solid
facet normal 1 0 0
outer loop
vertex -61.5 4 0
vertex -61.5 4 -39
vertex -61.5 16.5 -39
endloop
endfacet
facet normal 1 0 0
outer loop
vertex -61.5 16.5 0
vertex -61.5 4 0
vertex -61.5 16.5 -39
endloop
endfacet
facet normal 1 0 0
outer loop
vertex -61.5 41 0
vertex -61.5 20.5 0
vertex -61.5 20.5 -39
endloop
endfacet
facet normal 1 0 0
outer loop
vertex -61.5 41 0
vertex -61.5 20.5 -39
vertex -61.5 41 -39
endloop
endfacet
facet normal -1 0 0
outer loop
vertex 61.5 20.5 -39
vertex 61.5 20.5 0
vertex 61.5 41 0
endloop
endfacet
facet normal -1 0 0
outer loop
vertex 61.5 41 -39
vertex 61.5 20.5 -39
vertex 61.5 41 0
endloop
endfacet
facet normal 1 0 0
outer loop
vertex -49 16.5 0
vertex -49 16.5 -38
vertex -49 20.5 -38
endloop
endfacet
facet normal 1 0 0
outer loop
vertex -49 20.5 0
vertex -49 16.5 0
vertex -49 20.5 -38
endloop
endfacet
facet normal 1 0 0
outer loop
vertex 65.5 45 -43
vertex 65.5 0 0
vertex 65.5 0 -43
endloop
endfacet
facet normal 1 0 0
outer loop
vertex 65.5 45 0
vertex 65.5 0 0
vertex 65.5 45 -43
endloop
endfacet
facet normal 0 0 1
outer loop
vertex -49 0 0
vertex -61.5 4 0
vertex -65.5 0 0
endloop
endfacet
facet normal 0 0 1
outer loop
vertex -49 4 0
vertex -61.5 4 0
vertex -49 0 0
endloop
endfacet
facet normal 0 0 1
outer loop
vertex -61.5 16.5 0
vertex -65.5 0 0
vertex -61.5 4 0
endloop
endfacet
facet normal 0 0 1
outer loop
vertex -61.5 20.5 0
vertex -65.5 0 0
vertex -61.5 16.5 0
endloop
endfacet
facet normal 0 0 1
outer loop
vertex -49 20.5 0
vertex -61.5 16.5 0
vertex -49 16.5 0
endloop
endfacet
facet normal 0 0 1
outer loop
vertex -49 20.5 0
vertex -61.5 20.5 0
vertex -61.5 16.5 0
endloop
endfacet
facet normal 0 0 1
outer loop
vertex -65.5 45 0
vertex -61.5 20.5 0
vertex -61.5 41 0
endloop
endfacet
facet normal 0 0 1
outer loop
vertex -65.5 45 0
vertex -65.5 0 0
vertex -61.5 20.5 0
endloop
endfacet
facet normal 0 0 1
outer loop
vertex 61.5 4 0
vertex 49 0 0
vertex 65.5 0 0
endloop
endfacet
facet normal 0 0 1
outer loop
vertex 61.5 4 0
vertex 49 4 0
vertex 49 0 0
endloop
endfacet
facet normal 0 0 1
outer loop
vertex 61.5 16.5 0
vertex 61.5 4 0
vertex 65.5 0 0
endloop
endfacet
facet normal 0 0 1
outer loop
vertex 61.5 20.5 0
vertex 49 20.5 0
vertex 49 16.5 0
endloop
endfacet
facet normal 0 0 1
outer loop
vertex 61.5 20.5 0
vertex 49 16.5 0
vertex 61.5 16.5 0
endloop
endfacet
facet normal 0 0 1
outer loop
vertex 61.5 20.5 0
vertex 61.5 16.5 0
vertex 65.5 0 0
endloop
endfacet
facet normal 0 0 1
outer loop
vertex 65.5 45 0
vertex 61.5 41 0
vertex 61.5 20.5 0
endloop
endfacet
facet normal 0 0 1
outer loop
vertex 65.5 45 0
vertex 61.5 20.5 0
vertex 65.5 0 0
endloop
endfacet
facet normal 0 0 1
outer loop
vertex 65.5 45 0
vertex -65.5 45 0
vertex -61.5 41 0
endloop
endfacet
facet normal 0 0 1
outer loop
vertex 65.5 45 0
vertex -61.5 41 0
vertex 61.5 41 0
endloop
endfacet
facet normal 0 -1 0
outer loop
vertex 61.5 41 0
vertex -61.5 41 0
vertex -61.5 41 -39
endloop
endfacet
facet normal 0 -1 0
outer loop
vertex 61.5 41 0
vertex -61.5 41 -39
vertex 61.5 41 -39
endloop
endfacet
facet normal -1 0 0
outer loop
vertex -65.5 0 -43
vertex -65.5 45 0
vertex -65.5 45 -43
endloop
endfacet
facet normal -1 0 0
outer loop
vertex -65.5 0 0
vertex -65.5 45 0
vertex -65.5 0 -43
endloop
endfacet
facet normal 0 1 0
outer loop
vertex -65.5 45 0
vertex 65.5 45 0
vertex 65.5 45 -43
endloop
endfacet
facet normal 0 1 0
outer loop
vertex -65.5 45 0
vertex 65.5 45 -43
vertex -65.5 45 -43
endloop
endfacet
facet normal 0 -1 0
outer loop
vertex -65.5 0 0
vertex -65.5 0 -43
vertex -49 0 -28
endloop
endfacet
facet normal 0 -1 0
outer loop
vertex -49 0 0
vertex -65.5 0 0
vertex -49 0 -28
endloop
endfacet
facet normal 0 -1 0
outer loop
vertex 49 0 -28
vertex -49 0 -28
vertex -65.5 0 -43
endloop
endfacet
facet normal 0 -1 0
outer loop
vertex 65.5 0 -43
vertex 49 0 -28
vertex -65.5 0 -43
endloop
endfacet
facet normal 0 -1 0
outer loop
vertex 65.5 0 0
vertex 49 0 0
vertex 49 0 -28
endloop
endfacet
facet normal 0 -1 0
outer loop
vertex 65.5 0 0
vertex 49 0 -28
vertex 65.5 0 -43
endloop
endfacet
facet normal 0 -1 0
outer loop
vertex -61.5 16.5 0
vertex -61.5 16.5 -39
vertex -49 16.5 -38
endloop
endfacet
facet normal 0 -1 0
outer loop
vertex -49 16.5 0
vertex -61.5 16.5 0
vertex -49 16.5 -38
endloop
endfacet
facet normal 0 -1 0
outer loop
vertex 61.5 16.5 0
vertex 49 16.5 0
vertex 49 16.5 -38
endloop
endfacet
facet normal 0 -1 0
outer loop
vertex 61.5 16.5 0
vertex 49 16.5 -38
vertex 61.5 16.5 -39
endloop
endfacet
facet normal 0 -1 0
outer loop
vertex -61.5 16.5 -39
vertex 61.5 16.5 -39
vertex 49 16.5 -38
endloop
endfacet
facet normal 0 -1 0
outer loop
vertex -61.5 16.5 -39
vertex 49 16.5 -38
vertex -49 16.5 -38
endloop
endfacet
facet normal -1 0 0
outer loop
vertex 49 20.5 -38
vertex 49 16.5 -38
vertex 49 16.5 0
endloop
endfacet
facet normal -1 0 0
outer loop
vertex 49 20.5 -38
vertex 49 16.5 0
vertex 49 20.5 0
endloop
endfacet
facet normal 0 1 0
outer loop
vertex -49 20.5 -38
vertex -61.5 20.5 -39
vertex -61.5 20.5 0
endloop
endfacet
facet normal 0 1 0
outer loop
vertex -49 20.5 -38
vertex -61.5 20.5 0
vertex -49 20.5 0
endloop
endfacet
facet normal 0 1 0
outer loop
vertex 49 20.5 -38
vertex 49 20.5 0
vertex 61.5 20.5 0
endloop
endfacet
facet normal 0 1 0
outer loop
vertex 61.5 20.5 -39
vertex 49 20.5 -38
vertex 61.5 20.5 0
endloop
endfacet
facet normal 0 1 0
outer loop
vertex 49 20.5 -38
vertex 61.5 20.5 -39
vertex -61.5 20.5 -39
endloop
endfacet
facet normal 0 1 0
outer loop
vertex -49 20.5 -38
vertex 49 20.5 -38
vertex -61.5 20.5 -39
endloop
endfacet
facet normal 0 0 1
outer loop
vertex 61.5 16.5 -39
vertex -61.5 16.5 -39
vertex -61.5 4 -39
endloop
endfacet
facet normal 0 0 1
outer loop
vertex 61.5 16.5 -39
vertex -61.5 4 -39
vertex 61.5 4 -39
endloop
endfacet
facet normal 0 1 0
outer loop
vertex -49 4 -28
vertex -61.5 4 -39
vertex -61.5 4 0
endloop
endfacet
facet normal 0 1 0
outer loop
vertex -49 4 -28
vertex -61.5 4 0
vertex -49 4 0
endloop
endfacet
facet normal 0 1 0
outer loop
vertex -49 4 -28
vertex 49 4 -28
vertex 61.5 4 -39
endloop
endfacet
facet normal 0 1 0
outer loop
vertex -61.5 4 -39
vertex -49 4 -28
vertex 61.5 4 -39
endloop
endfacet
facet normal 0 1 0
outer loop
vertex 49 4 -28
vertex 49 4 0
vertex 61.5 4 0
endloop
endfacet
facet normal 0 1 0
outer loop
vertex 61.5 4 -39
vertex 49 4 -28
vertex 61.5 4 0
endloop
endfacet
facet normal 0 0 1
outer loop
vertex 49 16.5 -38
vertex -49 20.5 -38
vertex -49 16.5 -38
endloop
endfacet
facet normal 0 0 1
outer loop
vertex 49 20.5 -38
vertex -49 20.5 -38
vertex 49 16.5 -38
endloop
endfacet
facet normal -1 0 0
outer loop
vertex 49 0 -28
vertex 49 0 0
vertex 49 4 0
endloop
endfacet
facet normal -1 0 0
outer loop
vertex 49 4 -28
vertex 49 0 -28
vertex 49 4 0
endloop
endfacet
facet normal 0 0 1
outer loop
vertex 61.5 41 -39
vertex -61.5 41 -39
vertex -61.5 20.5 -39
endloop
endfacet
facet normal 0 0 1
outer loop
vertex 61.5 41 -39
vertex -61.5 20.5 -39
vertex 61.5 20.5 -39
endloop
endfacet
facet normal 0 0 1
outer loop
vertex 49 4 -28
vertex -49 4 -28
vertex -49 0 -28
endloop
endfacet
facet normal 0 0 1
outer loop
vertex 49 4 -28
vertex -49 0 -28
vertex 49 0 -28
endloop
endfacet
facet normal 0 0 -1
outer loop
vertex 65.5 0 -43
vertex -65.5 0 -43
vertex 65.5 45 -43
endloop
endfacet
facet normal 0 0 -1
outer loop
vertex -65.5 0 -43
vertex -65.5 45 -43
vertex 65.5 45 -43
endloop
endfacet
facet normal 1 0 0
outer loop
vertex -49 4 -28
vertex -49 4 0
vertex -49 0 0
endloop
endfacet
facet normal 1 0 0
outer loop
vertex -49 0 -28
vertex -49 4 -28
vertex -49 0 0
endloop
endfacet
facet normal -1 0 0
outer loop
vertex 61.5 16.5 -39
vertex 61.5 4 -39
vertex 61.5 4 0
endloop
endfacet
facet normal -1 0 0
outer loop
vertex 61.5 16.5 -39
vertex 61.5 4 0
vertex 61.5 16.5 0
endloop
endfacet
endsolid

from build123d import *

# Parameters (mm, degrees)
F1_DEPTH = 43
F3_DEPTH = 28
F4_W     = 123
F4_H     = 12.5
F5_DEPTH = 39
F6_W     = 98
F6_H     = 4
F7_DEPTH = 38
F8_W     = 123
F8_H     = 20.5
F9_DEPTH = 39


with BuildPart() as f1:
    # F0 (on Top) → F1 (new body)
    with BuildSketch(Plane.XY):
        Polygon((-65.5, 0), (0, 0), (65.5, 0), (65.5, 45), (0, 45), (-65.5, 45), align=None)
    extrude(amount=-F1_DEPTH)

    # F2 (on face) → F3 (cut)
    with BuildSketch(Plane.XY):
        Polygon((-49, 4), (-49, 0), (0, 0), (49, 0), (49, 4), (0, 4), align=None)
    extrude(amount=-F3_DEPTH, mode=Mode.SUBTRACT)

    # F4 (on face) → F5 (cut)
    with BuildSketch(Plane.XY):
        with Locations((0, 10.25)):
            Rectangle(F4_W, F4_H)
    extrude(amount=-F5_DEPTH, mode=Mode.SUBTRACT)

    # F6 (on face) → F7 (cut)
    with BuildSketch(Plane.XY):
        with Locations((0, 18.5)):
            Rectangle(F6_W, F6_H)
    extrude(amount=-F7_DEPTH, mode=Mode.SUBTRACT)

    # F8 (on face) → F9 (cut)
    with BuildSketch(Plane.XY):
        with Locations((0, 30.75)):
            Rectangle(F8_W, F8_H)
    extrude(amount=-F9_DEPTH, mode=Mode.SUBTRACT)


solid = f1.part
